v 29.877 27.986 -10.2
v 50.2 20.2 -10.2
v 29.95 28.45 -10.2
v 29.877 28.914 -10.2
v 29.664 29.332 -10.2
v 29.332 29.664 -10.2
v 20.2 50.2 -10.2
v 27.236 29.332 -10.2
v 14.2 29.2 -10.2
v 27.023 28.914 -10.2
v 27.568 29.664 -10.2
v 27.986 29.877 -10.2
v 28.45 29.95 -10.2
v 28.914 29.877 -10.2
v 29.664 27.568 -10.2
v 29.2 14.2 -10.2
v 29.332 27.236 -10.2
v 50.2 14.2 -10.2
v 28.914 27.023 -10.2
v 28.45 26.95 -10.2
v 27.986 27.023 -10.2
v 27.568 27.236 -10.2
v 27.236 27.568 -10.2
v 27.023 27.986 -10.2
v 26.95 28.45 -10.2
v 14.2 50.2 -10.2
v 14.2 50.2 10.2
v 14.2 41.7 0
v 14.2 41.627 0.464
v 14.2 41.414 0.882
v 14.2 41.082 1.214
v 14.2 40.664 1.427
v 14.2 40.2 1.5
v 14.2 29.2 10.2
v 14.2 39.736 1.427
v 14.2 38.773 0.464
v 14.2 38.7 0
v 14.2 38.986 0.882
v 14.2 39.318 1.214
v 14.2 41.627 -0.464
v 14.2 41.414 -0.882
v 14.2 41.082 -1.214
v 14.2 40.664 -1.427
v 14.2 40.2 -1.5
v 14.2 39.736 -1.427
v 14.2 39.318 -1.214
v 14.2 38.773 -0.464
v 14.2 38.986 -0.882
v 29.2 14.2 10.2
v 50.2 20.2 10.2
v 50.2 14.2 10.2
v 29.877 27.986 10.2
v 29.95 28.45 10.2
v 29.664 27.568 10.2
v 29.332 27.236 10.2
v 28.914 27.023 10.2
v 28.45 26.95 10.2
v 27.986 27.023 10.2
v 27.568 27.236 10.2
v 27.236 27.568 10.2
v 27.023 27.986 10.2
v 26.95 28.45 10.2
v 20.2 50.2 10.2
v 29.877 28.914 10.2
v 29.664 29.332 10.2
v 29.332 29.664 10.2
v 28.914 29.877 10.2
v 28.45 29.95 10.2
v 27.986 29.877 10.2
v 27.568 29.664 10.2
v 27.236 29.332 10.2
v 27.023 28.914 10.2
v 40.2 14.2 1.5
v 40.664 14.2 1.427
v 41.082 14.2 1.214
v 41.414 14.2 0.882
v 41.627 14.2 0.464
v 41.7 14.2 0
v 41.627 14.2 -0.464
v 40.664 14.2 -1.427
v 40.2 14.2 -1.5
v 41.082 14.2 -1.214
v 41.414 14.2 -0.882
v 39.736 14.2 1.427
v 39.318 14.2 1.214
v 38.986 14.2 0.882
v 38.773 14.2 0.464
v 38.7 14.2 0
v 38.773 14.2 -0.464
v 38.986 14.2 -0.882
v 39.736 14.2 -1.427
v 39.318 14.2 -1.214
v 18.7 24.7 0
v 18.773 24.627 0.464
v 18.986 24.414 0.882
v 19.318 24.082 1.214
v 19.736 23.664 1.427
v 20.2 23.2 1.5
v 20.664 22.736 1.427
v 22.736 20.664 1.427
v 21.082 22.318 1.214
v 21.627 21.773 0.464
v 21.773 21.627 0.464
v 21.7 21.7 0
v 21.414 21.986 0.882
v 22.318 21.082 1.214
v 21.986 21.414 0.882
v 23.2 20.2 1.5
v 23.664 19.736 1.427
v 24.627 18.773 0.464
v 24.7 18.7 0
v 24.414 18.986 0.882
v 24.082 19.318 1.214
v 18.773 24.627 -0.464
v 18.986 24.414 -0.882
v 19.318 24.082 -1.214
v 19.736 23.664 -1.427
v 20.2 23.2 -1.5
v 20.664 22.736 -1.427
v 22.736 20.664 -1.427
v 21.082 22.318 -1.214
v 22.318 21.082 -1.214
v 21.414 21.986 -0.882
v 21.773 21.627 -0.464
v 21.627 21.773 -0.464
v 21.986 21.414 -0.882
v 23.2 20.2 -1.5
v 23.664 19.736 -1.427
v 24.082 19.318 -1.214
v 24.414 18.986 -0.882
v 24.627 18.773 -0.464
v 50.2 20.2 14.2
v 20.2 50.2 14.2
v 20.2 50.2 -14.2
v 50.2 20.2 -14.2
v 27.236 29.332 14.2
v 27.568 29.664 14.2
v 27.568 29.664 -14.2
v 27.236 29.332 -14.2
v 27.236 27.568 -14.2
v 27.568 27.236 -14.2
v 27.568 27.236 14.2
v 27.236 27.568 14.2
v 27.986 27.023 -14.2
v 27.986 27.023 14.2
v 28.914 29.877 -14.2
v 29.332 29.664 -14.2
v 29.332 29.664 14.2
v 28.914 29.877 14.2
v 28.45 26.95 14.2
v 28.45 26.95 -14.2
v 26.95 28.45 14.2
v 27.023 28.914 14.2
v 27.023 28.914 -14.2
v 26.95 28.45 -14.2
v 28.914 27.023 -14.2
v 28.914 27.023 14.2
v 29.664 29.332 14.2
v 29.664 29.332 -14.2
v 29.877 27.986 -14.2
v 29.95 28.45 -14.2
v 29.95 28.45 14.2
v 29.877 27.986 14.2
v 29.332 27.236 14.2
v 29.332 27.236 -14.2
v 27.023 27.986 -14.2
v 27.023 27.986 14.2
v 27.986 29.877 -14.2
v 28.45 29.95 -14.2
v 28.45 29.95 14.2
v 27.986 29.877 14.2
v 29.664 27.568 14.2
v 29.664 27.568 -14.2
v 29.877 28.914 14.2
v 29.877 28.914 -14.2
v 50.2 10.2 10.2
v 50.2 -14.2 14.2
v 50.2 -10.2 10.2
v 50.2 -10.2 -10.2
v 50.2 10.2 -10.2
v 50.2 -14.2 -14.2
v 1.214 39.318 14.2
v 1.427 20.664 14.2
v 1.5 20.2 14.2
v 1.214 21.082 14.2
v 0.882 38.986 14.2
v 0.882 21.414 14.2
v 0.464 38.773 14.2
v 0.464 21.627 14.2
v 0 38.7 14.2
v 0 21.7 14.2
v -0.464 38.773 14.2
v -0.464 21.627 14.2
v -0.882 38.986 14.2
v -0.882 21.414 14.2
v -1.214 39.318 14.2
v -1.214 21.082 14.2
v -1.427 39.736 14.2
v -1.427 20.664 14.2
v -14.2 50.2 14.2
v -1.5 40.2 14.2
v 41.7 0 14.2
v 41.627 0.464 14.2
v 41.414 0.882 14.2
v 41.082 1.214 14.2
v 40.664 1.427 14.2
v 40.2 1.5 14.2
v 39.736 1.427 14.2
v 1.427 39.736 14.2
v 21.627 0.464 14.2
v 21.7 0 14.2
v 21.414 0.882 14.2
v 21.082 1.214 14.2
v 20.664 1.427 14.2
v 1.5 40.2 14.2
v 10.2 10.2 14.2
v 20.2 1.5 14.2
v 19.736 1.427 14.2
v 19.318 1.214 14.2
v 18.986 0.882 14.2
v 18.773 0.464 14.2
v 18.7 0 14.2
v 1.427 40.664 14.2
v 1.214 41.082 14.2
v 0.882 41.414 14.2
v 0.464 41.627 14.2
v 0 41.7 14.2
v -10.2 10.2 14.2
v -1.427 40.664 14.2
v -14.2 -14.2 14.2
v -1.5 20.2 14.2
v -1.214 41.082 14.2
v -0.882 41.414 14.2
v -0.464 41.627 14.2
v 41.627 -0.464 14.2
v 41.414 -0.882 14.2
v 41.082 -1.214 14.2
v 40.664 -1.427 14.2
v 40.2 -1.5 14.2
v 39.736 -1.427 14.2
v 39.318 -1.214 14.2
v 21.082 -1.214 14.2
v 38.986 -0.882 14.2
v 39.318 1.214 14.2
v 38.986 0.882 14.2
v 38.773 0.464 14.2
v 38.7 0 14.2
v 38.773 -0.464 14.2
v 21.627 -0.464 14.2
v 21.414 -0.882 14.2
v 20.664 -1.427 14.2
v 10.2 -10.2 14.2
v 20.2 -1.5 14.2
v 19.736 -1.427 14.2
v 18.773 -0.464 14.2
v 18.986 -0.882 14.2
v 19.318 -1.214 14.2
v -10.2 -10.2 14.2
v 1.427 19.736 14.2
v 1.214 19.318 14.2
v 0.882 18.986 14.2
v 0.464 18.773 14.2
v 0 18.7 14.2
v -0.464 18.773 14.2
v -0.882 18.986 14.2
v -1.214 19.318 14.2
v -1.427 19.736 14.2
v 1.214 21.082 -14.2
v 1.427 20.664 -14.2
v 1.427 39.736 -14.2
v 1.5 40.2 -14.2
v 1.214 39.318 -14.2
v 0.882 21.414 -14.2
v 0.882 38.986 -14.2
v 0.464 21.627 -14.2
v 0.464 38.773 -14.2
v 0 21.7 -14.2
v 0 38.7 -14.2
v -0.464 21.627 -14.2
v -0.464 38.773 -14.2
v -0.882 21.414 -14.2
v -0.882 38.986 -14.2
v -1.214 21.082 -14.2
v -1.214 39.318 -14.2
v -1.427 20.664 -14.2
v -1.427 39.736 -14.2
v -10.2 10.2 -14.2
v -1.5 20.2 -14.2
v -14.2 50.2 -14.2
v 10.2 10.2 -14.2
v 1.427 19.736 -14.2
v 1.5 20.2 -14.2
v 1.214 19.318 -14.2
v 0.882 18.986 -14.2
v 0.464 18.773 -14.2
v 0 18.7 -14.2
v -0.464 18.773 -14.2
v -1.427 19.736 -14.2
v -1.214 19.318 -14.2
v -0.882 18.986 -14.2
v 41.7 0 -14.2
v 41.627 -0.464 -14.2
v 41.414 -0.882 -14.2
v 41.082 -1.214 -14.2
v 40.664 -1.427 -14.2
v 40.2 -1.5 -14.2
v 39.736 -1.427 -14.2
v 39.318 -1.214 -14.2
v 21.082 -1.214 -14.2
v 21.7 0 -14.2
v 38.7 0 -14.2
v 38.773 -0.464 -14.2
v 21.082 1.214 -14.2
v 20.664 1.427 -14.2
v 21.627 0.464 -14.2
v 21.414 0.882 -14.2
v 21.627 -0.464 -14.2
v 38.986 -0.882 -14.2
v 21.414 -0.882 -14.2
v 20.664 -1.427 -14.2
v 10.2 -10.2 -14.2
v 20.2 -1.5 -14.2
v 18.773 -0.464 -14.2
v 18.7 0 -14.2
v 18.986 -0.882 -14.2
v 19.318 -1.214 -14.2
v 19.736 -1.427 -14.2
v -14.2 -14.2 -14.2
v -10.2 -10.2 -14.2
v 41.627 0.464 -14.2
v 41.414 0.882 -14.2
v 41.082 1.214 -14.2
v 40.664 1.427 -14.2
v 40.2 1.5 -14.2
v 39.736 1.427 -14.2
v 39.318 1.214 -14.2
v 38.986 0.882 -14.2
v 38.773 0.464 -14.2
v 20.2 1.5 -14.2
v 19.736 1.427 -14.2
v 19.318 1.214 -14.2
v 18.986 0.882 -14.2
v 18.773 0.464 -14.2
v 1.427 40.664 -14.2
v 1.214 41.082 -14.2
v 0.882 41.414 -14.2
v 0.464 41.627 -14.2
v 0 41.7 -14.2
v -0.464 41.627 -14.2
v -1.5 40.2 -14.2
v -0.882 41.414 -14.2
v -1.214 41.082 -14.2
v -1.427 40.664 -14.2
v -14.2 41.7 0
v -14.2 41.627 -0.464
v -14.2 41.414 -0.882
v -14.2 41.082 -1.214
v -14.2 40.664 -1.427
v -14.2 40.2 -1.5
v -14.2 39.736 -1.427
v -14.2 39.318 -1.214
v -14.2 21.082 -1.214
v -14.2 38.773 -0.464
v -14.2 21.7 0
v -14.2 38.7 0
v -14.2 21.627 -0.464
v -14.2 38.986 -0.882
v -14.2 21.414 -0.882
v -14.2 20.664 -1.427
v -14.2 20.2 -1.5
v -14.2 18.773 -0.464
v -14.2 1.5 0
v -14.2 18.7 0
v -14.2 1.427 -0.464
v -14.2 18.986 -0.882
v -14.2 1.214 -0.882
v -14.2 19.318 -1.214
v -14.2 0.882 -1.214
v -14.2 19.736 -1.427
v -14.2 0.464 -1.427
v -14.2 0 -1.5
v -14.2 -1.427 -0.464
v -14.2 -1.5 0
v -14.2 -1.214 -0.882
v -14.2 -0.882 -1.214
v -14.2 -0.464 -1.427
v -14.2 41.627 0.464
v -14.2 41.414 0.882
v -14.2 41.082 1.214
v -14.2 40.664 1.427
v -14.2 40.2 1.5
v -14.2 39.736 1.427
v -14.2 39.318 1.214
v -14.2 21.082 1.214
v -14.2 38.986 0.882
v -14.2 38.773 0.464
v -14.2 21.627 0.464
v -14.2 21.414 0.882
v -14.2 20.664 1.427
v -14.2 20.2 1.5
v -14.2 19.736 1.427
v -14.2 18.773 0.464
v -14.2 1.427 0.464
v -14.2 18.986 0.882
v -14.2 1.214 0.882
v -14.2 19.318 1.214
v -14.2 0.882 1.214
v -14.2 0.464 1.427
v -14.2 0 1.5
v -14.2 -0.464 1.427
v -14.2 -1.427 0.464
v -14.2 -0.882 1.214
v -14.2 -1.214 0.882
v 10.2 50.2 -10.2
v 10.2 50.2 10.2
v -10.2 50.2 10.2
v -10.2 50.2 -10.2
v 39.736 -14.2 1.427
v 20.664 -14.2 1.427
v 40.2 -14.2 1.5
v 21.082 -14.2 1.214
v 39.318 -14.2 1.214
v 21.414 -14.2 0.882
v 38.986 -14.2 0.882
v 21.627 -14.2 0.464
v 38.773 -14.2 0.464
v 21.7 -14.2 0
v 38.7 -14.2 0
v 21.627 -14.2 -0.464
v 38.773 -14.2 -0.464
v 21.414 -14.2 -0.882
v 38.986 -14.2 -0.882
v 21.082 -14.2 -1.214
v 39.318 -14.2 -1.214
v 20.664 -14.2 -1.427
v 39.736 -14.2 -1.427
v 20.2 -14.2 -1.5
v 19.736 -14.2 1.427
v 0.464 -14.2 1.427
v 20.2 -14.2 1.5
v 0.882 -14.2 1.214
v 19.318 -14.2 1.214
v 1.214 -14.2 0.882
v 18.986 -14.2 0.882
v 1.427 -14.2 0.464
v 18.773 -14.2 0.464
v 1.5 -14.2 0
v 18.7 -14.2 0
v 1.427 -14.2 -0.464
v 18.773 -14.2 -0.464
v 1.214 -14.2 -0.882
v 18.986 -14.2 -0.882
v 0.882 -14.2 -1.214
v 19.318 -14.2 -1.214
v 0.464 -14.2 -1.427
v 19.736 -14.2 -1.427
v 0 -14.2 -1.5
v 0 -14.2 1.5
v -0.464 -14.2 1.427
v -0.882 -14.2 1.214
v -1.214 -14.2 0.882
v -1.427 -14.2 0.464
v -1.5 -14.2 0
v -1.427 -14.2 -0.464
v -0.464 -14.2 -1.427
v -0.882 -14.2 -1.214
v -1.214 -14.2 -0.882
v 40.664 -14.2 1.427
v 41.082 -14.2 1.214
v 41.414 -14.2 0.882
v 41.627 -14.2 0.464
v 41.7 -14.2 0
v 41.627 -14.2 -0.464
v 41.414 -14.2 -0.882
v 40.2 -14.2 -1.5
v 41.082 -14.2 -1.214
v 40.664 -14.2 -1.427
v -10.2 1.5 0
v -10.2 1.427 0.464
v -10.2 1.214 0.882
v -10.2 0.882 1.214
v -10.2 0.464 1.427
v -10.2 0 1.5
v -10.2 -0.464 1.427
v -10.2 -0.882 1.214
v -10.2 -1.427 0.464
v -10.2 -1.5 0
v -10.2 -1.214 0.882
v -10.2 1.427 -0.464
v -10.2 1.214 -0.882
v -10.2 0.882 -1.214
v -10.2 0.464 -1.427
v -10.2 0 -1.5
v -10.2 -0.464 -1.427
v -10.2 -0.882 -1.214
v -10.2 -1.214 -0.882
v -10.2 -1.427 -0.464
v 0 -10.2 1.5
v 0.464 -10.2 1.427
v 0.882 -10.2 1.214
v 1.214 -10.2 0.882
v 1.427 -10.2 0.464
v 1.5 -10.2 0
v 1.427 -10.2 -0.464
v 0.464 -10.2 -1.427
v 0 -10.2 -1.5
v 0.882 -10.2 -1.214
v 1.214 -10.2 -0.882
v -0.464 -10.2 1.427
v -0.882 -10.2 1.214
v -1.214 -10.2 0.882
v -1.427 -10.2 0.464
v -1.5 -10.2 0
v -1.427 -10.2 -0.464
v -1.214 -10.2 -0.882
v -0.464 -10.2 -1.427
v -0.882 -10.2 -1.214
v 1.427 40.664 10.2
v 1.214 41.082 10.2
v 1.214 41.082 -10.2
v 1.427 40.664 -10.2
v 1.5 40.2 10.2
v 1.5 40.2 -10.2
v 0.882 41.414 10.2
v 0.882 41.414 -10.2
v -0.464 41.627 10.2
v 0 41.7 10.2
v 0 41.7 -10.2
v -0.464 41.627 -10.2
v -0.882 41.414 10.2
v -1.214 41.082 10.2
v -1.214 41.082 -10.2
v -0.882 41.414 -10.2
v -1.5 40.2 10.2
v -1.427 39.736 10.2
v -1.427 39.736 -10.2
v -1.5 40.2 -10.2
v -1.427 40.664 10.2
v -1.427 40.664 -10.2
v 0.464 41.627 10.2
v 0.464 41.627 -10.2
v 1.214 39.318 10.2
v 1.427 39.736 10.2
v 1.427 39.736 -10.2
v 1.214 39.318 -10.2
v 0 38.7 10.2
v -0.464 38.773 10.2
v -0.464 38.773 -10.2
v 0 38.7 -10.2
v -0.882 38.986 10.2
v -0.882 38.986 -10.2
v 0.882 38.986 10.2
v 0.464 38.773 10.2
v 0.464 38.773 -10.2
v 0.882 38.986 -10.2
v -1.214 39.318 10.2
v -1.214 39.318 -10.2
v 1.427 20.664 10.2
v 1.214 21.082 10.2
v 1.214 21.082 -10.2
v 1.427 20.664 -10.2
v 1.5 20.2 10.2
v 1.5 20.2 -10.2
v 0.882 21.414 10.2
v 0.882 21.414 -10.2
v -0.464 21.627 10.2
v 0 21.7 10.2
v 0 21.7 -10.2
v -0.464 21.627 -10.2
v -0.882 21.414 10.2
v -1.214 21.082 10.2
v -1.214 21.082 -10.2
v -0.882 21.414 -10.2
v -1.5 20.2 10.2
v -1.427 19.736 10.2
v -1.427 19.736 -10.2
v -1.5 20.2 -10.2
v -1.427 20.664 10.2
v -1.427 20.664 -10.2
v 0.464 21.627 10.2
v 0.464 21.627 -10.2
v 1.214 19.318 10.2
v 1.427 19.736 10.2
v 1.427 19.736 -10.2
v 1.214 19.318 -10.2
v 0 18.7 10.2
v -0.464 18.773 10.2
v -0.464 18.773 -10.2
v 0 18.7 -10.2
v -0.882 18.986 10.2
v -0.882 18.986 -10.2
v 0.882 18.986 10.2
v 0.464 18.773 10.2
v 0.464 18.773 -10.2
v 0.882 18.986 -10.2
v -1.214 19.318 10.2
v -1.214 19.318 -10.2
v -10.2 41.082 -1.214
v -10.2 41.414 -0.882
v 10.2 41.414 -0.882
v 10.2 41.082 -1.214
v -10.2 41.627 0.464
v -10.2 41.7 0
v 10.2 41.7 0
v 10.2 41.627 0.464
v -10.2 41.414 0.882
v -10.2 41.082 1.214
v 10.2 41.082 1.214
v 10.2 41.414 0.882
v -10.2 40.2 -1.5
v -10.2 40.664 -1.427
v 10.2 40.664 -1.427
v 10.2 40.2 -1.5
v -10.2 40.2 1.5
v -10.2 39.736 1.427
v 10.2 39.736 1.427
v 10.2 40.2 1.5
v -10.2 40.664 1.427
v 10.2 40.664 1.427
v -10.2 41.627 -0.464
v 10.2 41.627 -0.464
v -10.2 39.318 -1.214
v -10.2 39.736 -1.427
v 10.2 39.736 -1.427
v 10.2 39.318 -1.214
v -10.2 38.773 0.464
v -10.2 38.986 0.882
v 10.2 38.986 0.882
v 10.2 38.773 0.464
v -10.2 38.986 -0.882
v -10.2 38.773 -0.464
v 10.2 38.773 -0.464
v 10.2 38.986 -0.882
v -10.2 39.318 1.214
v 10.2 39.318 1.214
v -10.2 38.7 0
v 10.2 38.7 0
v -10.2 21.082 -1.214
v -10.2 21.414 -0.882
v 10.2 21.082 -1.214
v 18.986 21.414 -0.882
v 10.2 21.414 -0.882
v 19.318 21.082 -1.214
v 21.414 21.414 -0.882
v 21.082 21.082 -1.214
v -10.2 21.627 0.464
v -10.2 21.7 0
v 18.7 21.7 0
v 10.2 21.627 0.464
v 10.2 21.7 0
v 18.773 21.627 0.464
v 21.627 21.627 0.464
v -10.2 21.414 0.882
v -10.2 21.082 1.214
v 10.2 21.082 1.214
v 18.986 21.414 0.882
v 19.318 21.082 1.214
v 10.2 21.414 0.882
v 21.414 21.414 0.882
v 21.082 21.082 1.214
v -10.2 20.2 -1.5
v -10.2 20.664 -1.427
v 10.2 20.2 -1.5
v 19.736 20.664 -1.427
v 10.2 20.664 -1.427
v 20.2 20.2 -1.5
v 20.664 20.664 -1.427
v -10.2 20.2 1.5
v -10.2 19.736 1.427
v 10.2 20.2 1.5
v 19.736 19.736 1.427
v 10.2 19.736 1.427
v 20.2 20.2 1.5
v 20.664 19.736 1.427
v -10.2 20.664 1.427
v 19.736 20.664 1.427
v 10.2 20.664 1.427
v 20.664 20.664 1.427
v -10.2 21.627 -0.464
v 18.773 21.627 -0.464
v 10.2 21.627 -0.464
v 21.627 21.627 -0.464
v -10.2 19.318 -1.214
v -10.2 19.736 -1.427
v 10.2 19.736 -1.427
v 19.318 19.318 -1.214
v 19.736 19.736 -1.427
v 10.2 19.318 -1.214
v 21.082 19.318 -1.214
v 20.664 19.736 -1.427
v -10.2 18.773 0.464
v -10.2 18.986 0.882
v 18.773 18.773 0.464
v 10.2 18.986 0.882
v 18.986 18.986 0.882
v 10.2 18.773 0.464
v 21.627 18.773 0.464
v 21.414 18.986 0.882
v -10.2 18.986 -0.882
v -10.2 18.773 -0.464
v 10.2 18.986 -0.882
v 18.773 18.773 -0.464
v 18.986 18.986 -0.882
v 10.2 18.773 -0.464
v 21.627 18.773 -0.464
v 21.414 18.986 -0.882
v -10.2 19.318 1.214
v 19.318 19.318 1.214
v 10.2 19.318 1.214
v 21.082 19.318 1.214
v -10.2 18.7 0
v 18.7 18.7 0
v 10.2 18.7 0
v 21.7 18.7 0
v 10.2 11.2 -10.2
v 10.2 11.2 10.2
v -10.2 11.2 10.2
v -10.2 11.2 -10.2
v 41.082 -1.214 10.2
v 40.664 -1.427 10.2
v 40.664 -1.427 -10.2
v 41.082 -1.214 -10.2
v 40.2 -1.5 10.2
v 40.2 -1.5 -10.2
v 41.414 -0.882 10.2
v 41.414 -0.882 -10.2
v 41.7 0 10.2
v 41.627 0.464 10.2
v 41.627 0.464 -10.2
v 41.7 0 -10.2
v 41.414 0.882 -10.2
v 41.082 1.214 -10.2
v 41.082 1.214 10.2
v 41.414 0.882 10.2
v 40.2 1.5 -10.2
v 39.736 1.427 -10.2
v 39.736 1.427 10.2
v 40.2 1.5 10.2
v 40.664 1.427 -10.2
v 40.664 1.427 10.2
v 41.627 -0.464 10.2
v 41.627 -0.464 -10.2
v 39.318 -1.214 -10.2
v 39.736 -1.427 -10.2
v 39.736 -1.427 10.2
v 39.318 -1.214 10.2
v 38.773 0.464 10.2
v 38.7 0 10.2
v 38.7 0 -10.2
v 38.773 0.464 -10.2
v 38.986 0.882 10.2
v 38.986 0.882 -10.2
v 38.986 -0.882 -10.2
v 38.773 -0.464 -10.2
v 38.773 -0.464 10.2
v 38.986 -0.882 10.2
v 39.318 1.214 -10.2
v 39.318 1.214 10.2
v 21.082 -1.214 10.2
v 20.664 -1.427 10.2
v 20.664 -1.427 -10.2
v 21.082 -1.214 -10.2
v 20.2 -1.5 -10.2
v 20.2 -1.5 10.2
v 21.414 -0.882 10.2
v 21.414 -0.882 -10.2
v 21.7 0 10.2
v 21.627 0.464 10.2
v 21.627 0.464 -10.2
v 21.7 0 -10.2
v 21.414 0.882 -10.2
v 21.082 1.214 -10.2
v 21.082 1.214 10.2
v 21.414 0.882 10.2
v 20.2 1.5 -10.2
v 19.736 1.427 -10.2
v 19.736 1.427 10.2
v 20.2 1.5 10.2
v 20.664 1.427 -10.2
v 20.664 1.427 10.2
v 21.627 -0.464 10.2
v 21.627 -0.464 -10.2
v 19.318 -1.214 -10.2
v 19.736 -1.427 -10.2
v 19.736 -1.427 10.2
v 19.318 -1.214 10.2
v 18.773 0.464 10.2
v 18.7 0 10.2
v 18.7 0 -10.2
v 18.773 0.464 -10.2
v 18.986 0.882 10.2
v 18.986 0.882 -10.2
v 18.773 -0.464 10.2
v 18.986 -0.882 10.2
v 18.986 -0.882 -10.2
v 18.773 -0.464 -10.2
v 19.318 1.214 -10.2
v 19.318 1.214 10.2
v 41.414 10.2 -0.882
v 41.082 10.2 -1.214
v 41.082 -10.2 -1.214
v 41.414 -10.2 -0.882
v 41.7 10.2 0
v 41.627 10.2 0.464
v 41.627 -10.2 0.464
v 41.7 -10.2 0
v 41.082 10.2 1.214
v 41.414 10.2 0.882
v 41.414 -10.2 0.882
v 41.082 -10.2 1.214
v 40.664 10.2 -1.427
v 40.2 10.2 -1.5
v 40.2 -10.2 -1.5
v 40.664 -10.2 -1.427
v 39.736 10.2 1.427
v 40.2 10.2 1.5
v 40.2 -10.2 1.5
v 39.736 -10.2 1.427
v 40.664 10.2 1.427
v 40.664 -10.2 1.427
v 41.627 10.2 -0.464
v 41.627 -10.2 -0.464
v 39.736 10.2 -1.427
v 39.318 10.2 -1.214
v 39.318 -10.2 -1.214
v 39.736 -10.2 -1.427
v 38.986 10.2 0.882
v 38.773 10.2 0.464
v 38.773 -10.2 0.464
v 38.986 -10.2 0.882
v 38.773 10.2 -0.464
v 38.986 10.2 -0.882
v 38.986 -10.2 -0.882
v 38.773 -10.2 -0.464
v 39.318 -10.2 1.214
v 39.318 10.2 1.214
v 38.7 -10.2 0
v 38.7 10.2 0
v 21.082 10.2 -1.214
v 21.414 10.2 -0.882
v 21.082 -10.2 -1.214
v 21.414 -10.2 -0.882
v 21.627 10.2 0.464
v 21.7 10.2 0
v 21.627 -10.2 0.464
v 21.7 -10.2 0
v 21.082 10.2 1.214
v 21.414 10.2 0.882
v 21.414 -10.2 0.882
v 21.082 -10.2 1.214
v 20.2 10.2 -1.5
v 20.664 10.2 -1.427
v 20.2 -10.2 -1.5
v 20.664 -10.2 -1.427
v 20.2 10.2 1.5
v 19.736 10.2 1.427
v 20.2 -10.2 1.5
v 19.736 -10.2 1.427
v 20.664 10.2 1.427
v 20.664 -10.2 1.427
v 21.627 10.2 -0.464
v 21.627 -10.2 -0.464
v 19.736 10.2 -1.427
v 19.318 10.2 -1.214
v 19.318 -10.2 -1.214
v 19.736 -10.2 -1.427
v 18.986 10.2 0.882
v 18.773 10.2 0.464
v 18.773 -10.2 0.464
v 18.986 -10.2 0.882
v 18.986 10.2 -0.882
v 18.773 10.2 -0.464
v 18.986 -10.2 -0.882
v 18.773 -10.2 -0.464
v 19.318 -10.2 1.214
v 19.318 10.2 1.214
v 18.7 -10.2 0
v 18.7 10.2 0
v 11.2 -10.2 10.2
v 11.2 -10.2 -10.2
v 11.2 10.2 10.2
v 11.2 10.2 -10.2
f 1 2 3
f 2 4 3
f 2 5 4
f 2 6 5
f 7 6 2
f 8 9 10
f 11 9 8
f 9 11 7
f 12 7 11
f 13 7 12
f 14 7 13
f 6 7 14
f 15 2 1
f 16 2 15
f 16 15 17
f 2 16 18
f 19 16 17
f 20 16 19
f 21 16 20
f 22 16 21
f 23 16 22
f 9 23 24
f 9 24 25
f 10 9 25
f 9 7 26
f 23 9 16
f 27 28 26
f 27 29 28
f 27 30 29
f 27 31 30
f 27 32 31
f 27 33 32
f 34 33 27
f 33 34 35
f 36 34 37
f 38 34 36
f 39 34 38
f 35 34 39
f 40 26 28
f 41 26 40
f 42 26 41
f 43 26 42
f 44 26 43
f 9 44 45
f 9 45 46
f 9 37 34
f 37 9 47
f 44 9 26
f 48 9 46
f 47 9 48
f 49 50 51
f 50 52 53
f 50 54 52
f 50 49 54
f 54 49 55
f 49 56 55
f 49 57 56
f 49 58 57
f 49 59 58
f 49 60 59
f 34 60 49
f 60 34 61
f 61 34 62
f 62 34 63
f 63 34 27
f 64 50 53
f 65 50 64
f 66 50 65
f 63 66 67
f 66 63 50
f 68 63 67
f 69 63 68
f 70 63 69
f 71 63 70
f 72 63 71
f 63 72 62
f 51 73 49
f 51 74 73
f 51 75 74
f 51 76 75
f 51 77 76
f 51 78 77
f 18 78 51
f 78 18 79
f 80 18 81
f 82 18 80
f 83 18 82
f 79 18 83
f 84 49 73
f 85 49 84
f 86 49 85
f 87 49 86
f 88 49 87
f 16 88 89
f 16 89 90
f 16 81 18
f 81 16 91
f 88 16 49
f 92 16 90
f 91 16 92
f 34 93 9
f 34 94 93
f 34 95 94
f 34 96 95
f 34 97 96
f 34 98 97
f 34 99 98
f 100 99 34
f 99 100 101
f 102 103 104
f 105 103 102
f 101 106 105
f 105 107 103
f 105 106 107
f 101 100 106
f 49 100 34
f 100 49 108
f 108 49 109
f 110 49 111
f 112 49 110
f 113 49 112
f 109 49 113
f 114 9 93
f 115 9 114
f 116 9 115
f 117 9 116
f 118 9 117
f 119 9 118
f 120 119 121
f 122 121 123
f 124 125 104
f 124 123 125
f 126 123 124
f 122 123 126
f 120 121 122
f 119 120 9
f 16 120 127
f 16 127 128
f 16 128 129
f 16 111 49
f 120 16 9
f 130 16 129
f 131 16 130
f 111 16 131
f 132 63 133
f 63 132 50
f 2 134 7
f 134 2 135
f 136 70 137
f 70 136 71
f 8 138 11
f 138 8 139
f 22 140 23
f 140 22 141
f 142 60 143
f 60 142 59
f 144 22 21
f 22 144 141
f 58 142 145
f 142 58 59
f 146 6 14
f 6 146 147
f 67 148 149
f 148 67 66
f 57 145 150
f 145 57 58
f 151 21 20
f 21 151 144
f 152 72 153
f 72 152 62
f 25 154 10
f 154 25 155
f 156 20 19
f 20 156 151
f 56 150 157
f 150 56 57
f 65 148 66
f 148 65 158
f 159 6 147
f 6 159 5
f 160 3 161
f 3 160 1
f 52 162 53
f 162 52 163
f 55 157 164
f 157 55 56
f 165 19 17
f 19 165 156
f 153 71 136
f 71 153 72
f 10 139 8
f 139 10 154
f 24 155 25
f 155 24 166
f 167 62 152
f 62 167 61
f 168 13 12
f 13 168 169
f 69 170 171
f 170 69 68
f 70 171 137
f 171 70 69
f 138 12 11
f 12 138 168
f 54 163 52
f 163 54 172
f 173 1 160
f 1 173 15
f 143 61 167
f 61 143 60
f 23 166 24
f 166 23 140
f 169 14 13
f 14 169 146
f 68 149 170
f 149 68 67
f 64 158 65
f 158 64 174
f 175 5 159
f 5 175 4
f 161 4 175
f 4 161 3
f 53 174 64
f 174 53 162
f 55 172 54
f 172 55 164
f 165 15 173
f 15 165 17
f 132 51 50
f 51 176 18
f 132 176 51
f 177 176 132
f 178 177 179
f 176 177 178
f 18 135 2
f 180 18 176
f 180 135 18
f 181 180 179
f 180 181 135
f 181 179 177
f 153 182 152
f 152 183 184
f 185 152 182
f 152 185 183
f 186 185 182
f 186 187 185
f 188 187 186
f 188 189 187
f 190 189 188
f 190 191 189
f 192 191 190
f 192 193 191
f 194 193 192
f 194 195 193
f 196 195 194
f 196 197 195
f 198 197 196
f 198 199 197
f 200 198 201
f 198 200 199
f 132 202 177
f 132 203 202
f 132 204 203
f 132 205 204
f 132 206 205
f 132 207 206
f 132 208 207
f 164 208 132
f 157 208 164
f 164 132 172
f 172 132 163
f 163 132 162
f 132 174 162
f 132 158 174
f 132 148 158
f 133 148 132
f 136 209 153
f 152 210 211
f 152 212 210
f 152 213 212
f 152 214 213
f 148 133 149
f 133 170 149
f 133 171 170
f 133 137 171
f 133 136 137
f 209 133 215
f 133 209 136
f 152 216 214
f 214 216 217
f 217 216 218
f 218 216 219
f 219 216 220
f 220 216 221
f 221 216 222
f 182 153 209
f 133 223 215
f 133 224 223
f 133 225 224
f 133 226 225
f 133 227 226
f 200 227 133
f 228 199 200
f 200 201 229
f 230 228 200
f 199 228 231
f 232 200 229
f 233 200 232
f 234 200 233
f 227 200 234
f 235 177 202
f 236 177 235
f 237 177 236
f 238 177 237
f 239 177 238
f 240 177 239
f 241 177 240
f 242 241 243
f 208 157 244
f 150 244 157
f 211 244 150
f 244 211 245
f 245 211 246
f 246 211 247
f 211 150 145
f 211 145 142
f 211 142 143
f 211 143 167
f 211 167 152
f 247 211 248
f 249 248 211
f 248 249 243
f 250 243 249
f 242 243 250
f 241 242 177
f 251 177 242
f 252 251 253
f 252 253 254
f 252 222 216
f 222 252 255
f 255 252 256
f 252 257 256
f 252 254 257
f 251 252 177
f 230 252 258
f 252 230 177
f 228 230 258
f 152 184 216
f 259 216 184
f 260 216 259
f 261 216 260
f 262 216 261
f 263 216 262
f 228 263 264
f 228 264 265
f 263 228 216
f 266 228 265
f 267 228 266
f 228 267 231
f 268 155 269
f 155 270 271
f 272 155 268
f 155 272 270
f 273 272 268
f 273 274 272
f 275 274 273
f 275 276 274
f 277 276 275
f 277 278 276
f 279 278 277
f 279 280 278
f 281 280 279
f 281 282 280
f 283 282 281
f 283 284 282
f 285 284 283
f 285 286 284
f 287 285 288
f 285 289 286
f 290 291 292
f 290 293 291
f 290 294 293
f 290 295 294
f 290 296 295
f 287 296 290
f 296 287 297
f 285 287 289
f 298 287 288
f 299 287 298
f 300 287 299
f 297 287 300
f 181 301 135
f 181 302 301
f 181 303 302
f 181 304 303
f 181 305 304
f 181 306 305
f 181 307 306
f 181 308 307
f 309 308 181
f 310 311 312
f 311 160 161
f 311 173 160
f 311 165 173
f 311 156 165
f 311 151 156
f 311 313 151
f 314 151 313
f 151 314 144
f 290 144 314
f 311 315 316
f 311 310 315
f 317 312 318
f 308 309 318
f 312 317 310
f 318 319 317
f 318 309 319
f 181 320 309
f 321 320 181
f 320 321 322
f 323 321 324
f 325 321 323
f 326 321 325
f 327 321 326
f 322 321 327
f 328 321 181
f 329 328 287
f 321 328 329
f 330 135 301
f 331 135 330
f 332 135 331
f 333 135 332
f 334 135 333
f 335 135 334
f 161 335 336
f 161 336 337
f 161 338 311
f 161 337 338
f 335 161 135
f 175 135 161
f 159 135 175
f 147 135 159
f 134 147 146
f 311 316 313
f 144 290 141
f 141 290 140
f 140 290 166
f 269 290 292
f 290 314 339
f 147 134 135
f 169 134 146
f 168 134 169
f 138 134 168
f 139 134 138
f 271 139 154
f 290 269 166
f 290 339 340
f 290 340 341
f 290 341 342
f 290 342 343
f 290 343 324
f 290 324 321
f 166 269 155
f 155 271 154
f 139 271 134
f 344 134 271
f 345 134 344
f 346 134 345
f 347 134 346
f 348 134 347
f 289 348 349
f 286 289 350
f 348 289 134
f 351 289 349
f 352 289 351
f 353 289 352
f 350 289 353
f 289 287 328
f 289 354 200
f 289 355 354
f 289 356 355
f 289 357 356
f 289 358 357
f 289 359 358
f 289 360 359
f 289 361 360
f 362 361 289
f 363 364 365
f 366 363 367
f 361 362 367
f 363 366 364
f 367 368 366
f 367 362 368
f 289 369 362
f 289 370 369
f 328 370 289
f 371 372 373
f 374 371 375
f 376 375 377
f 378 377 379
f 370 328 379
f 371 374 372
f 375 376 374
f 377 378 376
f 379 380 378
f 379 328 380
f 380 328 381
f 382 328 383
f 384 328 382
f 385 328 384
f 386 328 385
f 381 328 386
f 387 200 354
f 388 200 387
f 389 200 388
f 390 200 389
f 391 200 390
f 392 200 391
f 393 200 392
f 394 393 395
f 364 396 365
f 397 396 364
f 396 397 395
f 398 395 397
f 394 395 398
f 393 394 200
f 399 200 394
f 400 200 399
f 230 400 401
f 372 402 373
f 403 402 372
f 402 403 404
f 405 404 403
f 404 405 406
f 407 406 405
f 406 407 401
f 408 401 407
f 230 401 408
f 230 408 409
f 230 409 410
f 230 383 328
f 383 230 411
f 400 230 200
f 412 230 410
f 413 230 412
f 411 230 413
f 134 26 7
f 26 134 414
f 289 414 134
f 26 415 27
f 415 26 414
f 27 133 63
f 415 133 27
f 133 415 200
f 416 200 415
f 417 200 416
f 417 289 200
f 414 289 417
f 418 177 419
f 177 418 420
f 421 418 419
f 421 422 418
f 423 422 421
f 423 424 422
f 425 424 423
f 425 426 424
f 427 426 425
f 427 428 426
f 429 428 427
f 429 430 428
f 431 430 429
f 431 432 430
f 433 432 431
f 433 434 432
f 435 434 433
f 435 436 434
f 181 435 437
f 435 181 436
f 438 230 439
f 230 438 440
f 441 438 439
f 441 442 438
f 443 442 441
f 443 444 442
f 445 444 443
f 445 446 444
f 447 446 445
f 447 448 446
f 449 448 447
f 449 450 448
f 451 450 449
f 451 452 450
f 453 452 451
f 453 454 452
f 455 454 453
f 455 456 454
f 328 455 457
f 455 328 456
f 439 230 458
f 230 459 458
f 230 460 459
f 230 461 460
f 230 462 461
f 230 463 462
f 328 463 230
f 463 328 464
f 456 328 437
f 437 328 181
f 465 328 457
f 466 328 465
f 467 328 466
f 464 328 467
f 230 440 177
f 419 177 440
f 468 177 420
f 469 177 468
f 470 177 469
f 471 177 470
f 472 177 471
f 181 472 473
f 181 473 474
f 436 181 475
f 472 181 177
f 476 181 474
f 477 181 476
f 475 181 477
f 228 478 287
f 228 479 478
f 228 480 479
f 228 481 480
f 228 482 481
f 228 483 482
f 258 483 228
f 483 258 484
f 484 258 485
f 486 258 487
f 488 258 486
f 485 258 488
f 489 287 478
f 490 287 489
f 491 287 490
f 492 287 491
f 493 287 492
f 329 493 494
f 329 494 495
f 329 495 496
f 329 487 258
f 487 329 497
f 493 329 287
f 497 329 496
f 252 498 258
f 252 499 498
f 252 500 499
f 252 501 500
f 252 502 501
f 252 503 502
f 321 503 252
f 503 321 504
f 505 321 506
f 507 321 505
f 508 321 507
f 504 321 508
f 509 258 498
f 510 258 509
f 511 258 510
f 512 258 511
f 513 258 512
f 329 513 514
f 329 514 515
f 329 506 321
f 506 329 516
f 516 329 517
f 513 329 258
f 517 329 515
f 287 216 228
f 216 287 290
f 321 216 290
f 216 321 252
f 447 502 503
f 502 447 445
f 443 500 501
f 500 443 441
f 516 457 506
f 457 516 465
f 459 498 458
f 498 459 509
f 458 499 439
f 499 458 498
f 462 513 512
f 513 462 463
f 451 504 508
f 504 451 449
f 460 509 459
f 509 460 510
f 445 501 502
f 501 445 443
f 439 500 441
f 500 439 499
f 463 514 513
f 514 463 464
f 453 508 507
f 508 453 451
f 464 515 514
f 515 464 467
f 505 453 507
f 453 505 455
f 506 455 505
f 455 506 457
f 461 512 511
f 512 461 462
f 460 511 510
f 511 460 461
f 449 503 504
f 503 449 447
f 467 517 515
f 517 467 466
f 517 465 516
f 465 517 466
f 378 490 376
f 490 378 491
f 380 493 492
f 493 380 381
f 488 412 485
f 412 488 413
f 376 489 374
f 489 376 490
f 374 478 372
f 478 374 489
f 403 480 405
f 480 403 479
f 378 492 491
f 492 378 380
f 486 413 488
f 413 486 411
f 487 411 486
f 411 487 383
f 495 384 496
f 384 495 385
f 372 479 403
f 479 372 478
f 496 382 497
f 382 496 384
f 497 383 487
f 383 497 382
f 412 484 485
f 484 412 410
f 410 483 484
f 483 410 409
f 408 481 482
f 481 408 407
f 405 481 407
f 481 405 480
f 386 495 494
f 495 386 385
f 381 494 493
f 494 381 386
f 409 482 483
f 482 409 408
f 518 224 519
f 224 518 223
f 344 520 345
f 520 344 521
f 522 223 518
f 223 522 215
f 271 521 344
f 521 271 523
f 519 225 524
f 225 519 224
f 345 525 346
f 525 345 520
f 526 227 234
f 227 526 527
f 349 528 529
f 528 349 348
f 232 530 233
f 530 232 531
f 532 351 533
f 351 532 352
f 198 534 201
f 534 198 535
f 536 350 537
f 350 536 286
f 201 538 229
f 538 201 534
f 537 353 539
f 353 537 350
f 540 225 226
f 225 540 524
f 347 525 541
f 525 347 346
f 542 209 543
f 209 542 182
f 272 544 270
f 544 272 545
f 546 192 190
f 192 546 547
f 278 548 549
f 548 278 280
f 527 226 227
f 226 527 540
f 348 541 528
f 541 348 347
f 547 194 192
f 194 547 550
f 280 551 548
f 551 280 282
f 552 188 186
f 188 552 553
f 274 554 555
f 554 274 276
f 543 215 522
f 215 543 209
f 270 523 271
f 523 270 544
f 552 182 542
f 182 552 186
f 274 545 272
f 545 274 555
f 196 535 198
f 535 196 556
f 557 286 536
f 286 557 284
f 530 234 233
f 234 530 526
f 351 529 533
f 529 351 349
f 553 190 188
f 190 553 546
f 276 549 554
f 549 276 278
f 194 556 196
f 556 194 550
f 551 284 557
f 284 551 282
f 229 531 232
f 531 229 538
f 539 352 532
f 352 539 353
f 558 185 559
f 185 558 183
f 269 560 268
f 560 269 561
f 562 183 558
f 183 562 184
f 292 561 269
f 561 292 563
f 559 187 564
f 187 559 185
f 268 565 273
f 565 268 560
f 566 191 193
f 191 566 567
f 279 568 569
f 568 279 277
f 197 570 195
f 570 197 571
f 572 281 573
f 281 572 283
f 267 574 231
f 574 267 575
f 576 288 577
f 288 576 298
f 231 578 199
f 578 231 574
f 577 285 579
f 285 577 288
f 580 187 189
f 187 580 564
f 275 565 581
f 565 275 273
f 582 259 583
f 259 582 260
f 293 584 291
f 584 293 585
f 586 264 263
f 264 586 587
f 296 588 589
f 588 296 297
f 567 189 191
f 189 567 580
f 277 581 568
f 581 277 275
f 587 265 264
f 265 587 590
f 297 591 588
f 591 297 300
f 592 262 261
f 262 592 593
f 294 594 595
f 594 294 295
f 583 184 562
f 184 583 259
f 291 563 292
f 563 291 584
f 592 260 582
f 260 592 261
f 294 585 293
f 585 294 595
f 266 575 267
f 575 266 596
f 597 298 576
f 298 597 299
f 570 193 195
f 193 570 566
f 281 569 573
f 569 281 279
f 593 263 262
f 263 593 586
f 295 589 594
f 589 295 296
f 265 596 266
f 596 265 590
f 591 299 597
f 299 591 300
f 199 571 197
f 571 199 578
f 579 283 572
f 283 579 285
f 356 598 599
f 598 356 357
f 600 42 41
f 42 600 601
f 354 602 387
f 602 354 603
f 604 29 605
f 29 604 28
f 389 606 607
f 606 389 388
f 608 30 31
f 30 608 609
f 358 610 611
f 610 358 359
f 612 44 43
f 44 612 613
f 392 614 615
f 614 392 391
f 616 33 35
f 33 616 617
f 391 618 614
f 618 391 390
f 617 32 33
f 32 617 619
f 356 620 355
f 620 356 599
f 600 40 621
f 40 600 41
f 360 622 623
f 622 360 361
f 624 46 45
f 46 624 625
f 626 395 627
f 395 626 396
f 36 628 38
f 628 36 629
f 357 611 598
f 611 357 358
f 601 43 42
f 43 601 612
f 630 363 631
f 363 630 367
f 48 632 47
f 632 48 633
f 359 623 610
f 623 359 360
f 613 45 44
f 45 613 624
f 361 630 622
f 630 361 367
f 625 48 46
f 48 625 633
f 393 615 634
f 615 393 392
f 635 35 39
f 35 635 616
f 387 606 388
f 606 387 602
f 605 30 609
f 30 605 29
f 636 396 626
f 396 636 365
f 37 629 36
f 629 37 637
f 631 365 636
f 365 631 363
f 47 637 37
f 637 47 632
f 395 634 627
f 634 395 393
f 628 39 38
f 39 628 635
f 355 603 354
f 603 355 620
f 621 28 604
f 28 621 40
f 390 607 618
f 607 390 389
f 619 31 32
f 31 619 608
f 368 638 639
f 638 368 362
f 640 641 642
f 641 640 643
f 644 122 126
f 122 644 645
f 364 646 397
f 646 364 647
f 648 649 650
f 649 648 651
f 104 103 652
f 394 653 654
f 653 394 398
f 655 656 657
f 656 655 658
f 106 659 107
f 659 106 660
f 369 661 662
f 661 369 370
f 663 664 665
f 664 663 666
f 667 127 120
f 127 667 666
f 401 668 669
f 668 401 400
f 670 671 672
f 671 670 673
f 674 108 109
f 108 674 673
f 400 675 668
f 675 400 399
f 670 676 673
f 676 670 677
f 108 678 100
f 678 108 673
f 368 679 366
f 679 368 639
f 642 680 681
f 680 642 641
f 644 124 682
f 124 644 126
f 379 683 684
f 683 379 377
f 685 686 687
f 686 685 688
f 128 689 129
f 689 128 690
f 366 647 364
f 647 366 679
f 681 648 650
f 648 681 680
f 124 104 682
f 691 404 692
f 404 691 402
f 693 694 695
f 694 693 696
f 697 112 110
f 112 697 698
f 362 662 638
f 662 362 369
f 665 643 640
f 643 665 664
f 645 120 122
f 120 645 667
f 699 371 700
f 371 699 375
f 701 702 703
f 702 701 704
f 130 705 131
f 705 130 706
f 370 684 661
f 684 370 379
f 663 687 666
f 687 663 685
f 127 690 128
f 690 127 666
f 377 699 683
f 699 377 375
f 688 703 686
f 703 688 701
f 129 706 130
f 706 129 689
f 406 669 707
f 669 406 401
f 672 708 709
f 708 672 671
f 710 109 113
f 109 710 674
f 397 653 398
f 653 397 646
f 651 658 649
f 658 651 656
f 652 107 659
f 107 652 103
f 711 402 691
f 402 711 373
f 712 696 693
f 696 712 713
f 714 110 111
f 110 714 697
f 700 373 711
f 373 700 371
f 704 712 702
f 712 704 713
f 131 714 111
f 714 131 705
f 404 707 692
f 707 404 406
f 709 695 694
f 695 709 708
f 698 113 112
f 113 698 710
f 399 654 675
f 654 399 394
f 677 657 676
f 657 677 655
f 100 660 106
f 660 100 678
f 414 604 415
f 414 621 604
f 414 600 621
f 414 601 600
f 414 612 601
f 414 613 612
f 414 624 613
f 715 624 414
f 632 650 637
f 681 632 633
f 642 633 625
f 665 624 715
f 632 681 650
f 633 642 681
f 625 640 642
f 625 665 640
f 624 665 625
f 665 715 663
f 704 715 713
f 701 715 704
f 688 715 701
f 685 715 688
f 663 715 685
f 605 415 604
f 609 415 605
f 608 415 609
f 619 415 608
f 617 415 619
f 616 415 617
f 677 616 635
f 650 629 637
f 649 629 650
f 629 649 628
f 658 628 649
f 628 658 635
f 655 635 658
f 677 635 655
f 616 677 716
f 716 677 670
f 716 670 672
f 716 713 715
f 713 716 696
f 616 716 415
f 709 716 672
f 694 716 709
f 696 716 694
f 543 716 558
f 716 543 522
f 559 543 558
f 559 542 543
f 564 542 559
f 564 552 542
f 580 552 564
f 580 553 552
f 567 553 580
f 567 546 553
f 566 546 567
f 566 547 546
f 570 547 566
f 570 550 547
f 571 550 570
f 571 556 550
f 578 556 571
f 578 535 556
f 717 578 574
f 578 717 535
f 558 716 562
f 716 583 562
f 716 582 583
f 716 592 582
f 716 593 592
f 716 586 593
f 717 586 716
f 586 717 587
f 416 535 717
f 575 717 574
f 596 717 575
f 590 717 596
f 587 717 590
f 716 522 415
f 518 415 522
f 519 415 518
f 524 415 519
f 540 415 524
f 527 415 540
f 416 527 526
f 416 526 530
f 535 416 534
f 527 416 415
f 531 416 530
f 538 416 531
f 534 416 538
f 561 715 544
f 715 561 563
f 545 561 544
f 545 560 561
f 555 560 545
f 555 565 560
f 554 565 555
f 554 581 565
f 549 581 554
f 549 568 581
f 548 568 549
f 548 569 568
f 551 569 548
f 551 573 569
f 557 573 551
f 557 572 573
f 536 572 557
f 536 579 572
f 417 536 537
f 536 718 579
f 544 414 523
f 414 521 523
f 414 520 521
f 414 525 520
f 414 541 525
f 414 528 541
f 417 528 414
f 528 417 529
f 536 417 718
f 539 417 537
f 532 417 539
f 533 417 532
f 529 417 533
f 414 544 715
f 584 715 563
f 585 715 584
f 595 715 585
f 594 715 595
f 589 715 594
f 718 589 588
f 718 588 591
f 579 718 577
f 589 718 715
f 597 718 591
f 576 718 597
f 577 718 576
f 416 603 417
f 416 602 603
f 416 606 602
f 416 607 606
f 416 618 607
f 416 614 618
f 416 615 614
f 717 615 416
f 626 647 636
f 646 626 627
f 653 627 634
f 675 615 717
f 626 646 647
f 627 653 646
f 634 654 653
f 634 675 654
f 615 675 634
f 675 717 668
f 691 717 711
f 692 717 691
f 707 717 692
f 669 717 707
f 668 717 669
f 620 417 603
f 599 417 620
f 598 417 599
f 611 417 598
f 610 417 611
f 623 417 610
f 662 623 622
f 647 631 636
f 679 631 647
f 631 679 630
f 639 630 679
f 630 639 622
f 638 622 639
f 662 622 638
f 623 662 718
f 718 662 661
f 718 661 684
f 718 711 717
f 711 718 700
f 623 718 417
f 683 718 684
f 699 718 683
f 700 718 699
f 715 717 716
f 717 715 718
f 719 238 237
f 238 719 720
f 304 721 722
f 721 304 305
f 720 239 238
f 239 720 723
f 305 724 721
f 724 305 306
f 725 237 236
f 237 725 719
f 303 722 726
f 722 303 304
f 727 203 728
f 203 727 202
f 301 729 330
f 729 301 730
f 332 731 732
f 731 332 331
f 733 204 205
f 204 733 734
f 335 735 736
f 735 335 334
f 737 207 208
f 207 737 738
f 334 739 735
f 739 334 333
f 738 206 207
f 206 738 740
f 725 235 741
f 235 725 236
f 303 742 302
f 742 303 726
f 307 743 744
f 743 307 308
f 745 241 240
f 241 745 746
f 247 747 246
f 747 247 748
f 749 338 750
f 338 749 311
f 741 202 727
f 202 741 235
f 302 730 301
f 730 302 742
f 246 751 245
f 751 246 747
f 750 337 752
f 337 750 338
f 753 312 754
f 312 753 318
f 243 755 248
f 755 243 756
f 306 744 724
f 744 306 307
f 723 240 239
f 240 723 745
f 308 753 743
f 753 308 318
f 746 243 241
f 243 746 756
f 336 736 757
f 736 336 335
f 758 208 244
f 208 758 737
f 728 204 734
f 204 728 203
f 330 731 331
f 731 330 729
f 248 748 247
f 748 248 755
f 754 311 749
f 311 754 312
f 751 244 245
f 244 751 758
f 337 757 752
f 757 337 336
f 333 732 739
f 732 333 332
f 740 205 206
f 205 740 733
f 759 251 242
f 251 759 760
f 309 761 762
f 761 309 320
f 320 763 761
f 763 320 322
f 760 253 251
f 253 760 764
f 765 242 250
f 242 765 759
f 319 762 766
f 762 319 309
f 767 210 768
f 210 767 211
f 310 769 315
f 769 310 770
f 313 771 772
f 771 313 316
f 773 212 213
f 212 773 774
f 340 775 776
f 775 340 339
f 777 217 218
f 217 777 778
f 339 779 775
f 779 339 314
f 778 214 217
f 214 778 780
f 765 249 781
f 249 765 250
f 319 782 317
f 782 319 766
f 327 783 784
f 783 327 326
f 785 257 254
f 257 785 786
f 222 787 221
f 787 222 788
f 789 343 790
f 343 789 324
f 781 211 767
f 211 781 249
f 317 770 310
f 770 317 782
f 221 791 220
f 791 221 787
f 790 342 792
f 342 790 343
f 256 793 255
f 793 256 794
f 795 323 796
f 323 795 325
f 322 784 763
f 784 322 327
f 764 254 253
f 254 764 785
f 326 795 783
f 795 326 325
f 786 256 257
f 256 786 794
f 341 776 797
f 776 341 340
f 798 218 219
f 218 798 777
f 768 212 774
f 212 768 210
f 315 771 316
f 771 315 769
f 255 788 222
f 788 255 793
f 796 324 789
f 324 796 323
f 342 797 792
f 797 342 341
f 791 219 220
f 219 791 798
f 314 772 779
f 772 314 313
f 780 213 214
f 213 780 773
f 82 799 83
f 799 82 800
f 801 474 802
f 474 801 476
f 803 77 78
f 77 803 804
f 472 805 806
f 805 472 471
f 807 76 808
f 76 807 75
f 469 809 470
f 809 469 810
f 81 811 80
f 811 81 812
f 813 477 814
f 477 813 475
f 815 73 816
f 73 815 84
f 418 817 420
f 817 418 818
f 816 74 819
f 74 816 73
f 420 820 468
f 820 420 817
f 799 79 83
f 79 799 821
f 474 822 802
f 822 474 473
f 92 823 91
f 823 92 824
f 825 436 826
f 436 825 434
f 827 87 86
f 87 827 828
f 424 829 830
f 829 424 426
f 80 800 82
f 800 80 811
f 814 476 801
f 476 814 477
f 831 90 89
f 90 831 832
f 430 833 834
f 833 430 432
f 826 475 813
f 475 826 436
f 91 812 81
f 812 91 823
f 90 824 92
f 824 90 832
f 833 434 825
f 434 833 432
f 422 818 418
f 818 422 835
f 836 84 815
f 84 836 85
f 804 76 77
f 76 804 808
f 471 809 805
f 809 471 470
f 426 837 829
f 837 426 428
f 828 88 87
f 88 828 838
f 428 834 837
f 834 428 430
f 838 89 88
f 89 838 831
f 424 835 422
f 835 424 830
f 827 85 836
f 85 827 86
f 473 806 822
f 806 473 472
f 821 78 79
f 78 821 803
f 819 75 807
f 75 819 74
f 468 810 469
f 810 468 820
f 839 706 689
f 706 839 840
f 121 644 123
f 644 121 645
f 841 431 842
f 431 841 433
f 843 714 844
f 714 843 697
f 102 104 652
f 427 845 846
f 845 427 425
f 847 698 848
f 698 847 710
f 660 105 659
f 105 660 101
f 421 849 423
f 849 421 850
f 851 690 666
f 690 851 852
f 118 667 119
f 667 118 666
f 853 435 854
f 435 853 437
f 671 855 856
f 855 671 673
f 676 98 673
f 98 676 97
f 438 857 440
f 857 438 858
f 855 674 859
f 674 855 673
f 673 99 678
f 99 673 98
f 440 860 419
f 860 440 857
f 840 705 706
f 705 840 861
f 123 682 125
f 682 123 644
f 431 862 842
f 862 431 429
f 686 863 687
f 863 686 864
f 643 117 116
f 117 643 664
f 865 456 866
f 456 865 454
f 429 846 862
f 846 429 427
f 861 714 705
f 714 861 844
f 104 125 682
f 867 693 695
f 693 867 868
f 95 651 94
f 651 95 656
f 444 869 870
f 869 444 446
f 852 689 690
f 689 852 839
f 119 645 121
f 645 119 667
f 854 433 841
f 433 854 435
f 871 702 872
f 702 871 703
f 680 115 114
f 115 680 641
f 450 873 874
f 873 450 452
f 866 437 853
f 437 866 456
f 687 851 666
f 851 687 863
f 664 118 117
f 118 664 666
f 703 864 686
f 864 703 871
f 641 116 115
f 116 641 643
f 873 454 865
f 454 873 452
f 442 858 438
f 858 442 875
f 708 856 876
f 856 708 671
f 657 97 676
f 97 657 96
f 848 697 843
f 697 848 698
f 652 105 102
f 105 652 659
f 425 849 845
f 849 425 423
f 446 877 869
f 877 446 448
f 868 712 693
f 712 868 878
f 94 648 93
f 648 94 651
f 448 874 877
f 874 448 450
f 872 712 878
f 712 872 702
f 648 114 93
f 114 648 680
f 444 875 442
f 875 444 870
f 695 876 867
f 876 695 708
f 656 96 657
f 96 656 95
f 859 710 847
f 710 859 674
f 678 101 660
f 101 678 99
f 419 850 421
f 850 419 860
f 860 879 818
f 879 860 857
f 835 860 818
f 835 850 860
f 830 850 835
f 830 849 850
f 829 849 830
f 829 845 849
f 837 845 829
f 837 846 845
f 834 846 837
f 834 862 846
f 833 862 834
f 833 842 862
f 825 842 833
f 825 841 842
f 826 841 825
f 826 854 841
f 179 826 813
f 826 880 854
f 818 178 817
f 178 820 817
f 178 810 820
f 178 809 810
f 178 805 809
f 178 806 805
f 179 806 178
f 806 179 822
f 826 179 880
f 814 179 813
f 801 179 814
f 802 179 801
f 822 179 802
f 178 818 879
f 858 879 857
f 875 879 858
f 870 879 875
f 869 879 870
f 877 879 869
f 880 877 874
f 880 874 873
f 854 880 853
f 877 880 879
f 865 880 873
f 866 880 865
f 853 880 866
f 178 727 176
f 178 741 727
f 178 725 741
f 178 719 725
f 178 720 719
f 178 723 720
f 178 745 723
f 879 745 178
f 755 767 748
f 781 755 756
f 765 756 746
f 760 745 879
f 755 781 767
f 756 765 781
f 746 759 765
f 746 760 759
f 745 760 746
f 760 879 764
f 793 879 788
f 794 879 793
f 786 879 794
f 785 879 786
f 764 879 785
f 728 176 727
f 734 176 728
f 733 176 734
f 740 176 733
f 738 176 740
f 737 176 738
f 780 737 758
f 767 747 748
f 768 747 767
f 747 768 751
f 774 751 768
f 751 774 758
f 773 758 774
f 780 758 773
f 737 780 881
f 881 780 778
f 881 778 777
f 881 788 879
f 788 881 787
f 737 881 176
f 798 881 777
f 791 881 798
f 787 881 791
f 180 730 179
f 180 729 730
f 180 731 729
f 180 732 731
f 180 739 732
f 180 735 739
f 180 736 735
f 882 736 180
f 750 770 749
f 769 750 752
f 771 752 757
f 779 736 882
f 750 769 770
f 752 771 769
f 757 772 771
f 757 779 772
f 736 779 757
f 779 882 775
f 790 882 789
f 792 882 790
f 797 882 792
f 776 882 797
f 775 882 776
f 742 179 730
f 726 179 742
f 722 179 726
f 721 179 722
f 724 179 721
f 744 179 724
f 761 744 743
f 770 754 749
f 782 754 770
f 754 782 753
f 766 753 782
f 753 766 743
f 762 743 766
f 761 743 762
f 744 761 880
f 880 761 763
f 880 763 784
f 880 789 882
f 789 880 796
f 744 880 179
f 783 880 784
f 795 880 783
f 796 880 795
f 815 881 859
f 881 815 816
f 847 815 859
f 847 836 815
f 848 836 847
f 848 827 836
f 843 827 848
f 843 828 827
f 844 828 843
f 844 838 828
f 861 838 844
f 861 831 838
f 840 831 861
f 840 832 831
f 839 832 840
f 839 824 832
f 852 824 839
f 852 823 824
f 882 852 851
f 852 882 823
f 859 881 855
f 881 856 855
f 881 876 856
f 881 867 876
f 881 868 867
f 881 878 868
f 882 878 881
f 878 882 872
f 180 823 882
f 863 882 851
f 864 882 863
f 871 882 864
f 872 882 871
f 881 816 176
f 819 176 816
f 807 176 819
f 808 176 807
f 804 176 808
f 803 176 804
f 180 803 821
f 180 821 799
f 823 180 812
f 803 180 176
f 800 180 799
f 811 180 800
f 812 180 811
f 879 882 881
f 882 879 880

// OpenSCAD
// file: config.scad
$fn=20;

aluminium_extrusion_size = 20.4;
aluminium_extrusion_length = 650;



material_on_rod_length = 40; // the length of material wrapping the rods
material_thickness = 4;

screw_diameter = 3;

screw_diameter_m6 = 6;
nut_diameter_m6 = 11.7;
nut_height_m6 = 5;

reinforcement_3D_size = 15;
reinforcement_2D_size = 15;
reinforcement_2D_unsharp_size = 30;

base_unsharp_size = 10;


// do not touch
screw_height = 100;
reinforcement_3D_margin = 1;
reinforcement_2D_margin = 1;
base_unsharp_margin = 1;


// computed

base_cube_size = aluminium_extrusion_size + material_on_rod_length + material_thickness;
base_cube_offset = (base_cube_size / 2) - (aluminium_extrusion_size / 2) - material_thickness;


module screw() {
    cylinder(r=(screw_diameter / 2), h=screw_height , center=true);
}
// screw

module rod() {
    color([0.7, 0.7, 0.7, 1])
		cube([aluminium_extrusion_size, aluminium_extrusion_length,aluminium_extrusion_size], center=true);
}
// rod

module positioned_aluminium_extrusion_rod_screw_holder(rel_pos, rotation) {
	
	base_border = (aluminium_extrusion_size / 2) + material_on_rod_length;
	
	rotate([0, 90 * rotation, 0])
	translate([0, base_border + rel_pos, 0])
	screw();
}
// positioned_aluminium_extrusion_rod_screw_holder

module positioned_aluminium_extrusion_rod() {
	
	delta = (aluminium_extrusion_length / 2) + (aluminium_extrusion_size / 2) + 1;
	
	translate([0, delta, 0])
	rod();
	
	
	base_border = (aluminium_extrusion_size / 2) + material_on_rod_length;
	
	color([1, 0, 0, 0.7])
	union() {
		positioned_aluminium_extrusion_rod_screw_holder(-10, 0);
		positioned_aluminium_extrusion_rod_screw_holder(-(material_on_rod_length - 10), 0);
		positioned_aluminium_extrusion_rod_screw_holder(-10, 1);
		positioned_aluminium_extrusion_rod_screw_holder(-(material_on_rod_length - 10), 1);
	}
}
//positioned_aluminium_extrusion_rod


module reinforcement_3D() {
	reinforcement_3D_points = [
		[0, 0, 0],
		[reinforcement_3D_size + reinforcement_3D_margin, 0, 0],
		[0, reinforcement_3D_size + reinforcement_3D_margin, 0],
		[0, 0, reinforcement_3D_size + reinforcement_3D_margin],
	];
  
	reinforcement_3D_faces = [
		[0, 1, 2], // x, y plan
		[0, 2, 3], // y, z plan
		[0, 3, 1], // x, z plan
		[1, 3, 2]
	]; 
  
	polyhedron(reinforcement_3D_points, reinforcement_3D_faces);
}
// reinforcement_3D

module reinforcement_2D() {
	reinforcement_2D_width = aluminium_extrusion_size + reinforcement_2D_margin;
	translate([0, 0, -(reinforcement_2D_width / 2)])
    linear_extrude(height=reinforcement_2D_width)
    polygon([
        [0, 0],
        [reinforcement_2D_size + reinforcement_2D_margin, 0],
        [0, reinforcement_2D_size + reinforcement_2D_margin]
    ]);
}
//reinforcement_2D


module base_cube_remove_inner_2D_corner() {
	base_cube_remove_inner_2D_corner_size = material_on_rod_length * 1;
	
	base_cube_remove_inner_2D_corner_offset = (base_cube_remove_inner_2D_corner_size / 2) + (aluminium_extrusion_size / 2) + material_thickness;
	
	reinforcement_2D_offset = (aluminium_extrusion_size / 2) + material_thickness - (reinforcement_2D_margin / 2);
	
	
	base_cube_remove_inner_2D_corner_unsharp_length = aluminium_extrusion_size + (material_thickness * 2) + 1;
	
	base_cube_remove_inner_2D_corner_unsharp_size = reinforcement_2D_unsharp_size * sqrt(2);
	
	base_cube_remove_inner_2D_corner_unsharp_offset = (aluminium_extrusion_size / 2) + material_on_rod_length;
	
	screw_offset = (reinforcement_2D_size + ((material_on_rod_length - material_thickness) * 2 - reinforcement_2D_unsharp_size)) / 4
	+ (aluminium_extrusion_size / 2) + material_thickness;
	
	color([1, 0, 0, 0.7])
	union() {
		difference() {
			translate([0, base_cube_remove_inner_2D_corner_offset, base_cube_remove_inner_2D_corner_offset])
			cube([aluminium_extrusion_size, base_cube_remove_inner_2D_corner_size, base_cube_remove_inner_2D_corner_size], center=true);
			
			translate([0, reinforcement_2D_offset, 		reinforcement_2D_offset])
			rotate([0, -90, 0])
			reinforcement_2D();
		}
		
		
		translate([0, base_cube_remove_inner_2D_corner_unsharp_offset, 		base_cube_remove_inner_2D_corner_unsharp_offset])
		rotate([45, 0, 0])
		cube([base_cube_remove_inner_2D_corner_unsharp_length, base_cube_remove_inner_2D_corner_unsharp_size, base_cube_remove_inner_2D_corner_unsharp_size], center=true);
	
		translate([0, screw_offset, screw_offset])
		rotate([0, 90, 0])
		screw();
	}
}
// base_cube_remove_inner_2D_corner

//base_cube_remove_inner_2D_corner();

module _calibration_screw_m6_test() {
	
	_calibration_rod_test_thickness = 2;
	_calibration_rod_test_size = nut_diameter_m6 + (_calibration_rod_test_thickness * 2);
	
	difference() {
		
		cube([_calibration_rod_test_size, _calibration_rod_test_size, 4], center=true);
		
		cylinder(r=(nut_diameter_m6 / 2), h=50 , $fn=6, center=true);
	}
}
// _calibration_screw_m6_test


module _calibration_rod_test() {
	
	_calibration_screw_test_thickness = 2;
	_calibration_screw_test_size = aluminium_extrusion_size + (_calibration_screw_test_thickness * 2);
	
	difference() {
		
		cube([_calibration_screw_test_size, _calibration_screw_test_size, 4], center=true);
		
		cube([aluminium_extrusion_size, aluminium_extrusion_size, aluminium_extrusion_length], center=true);
	}
}
// _calibration_rod_test
//_calibration_rod_test();
//_calibration_screw_m6_test();
// main file
include <config.scad>

// compted 
base_cube_height = aluminium_extrusion_size + (material_thickness * 2);

module attached_extrusion_rod() {
	
	screw_offset = -(screw_height / 2);
	union() { // difference
		
		rotate([90, 0, 0])
		rod();
		
		translate([0, screw_offset, 0])
		rotate([90, 0, 0])
		screw();
		
		translate([screw_offset, 0, 0])
		rotate([0, 90, 0])
		screw();
	}
}
// attached_extrusion_rod
//attached_extrusion_rod();

module positioned_aluminium_extrusion_rods() {
	union() {
		positioned_aluminium_extrusion_rod();
		
		rotate([0, 0, -90])
		positioned_aluminium_extrusion_rod();
	}
}
// positioned_aluminium_extrusion_rods
//positioned_aluminium_extrusion_rods();

module base_cube_remove_inner_2D_corners() {
	union() {
		rotate([0, 90, 0])
		base_cube_remove_inner_2D_corner();
	}
}
//base_cube_remove_inner_2D_corners
//base_cube_remove_inner_2D_corners();


module base_cube() {
	color([1, 1, 0, 0.7])
	difference() {
		translate([base_cube_offset, base_cube_offset, 0])
		cube([base_cube_size, base_cube_size, base_cube_height], center=true);
		
		base_cube_remove_inner_2D_corners();
	}
}
// base_cube

module _render() {
	difference() {
		base_cube();
		attached_extrusion_rod();
		positioned_aluminium_extrusion_rods();
	}
}
// _render

_render();
